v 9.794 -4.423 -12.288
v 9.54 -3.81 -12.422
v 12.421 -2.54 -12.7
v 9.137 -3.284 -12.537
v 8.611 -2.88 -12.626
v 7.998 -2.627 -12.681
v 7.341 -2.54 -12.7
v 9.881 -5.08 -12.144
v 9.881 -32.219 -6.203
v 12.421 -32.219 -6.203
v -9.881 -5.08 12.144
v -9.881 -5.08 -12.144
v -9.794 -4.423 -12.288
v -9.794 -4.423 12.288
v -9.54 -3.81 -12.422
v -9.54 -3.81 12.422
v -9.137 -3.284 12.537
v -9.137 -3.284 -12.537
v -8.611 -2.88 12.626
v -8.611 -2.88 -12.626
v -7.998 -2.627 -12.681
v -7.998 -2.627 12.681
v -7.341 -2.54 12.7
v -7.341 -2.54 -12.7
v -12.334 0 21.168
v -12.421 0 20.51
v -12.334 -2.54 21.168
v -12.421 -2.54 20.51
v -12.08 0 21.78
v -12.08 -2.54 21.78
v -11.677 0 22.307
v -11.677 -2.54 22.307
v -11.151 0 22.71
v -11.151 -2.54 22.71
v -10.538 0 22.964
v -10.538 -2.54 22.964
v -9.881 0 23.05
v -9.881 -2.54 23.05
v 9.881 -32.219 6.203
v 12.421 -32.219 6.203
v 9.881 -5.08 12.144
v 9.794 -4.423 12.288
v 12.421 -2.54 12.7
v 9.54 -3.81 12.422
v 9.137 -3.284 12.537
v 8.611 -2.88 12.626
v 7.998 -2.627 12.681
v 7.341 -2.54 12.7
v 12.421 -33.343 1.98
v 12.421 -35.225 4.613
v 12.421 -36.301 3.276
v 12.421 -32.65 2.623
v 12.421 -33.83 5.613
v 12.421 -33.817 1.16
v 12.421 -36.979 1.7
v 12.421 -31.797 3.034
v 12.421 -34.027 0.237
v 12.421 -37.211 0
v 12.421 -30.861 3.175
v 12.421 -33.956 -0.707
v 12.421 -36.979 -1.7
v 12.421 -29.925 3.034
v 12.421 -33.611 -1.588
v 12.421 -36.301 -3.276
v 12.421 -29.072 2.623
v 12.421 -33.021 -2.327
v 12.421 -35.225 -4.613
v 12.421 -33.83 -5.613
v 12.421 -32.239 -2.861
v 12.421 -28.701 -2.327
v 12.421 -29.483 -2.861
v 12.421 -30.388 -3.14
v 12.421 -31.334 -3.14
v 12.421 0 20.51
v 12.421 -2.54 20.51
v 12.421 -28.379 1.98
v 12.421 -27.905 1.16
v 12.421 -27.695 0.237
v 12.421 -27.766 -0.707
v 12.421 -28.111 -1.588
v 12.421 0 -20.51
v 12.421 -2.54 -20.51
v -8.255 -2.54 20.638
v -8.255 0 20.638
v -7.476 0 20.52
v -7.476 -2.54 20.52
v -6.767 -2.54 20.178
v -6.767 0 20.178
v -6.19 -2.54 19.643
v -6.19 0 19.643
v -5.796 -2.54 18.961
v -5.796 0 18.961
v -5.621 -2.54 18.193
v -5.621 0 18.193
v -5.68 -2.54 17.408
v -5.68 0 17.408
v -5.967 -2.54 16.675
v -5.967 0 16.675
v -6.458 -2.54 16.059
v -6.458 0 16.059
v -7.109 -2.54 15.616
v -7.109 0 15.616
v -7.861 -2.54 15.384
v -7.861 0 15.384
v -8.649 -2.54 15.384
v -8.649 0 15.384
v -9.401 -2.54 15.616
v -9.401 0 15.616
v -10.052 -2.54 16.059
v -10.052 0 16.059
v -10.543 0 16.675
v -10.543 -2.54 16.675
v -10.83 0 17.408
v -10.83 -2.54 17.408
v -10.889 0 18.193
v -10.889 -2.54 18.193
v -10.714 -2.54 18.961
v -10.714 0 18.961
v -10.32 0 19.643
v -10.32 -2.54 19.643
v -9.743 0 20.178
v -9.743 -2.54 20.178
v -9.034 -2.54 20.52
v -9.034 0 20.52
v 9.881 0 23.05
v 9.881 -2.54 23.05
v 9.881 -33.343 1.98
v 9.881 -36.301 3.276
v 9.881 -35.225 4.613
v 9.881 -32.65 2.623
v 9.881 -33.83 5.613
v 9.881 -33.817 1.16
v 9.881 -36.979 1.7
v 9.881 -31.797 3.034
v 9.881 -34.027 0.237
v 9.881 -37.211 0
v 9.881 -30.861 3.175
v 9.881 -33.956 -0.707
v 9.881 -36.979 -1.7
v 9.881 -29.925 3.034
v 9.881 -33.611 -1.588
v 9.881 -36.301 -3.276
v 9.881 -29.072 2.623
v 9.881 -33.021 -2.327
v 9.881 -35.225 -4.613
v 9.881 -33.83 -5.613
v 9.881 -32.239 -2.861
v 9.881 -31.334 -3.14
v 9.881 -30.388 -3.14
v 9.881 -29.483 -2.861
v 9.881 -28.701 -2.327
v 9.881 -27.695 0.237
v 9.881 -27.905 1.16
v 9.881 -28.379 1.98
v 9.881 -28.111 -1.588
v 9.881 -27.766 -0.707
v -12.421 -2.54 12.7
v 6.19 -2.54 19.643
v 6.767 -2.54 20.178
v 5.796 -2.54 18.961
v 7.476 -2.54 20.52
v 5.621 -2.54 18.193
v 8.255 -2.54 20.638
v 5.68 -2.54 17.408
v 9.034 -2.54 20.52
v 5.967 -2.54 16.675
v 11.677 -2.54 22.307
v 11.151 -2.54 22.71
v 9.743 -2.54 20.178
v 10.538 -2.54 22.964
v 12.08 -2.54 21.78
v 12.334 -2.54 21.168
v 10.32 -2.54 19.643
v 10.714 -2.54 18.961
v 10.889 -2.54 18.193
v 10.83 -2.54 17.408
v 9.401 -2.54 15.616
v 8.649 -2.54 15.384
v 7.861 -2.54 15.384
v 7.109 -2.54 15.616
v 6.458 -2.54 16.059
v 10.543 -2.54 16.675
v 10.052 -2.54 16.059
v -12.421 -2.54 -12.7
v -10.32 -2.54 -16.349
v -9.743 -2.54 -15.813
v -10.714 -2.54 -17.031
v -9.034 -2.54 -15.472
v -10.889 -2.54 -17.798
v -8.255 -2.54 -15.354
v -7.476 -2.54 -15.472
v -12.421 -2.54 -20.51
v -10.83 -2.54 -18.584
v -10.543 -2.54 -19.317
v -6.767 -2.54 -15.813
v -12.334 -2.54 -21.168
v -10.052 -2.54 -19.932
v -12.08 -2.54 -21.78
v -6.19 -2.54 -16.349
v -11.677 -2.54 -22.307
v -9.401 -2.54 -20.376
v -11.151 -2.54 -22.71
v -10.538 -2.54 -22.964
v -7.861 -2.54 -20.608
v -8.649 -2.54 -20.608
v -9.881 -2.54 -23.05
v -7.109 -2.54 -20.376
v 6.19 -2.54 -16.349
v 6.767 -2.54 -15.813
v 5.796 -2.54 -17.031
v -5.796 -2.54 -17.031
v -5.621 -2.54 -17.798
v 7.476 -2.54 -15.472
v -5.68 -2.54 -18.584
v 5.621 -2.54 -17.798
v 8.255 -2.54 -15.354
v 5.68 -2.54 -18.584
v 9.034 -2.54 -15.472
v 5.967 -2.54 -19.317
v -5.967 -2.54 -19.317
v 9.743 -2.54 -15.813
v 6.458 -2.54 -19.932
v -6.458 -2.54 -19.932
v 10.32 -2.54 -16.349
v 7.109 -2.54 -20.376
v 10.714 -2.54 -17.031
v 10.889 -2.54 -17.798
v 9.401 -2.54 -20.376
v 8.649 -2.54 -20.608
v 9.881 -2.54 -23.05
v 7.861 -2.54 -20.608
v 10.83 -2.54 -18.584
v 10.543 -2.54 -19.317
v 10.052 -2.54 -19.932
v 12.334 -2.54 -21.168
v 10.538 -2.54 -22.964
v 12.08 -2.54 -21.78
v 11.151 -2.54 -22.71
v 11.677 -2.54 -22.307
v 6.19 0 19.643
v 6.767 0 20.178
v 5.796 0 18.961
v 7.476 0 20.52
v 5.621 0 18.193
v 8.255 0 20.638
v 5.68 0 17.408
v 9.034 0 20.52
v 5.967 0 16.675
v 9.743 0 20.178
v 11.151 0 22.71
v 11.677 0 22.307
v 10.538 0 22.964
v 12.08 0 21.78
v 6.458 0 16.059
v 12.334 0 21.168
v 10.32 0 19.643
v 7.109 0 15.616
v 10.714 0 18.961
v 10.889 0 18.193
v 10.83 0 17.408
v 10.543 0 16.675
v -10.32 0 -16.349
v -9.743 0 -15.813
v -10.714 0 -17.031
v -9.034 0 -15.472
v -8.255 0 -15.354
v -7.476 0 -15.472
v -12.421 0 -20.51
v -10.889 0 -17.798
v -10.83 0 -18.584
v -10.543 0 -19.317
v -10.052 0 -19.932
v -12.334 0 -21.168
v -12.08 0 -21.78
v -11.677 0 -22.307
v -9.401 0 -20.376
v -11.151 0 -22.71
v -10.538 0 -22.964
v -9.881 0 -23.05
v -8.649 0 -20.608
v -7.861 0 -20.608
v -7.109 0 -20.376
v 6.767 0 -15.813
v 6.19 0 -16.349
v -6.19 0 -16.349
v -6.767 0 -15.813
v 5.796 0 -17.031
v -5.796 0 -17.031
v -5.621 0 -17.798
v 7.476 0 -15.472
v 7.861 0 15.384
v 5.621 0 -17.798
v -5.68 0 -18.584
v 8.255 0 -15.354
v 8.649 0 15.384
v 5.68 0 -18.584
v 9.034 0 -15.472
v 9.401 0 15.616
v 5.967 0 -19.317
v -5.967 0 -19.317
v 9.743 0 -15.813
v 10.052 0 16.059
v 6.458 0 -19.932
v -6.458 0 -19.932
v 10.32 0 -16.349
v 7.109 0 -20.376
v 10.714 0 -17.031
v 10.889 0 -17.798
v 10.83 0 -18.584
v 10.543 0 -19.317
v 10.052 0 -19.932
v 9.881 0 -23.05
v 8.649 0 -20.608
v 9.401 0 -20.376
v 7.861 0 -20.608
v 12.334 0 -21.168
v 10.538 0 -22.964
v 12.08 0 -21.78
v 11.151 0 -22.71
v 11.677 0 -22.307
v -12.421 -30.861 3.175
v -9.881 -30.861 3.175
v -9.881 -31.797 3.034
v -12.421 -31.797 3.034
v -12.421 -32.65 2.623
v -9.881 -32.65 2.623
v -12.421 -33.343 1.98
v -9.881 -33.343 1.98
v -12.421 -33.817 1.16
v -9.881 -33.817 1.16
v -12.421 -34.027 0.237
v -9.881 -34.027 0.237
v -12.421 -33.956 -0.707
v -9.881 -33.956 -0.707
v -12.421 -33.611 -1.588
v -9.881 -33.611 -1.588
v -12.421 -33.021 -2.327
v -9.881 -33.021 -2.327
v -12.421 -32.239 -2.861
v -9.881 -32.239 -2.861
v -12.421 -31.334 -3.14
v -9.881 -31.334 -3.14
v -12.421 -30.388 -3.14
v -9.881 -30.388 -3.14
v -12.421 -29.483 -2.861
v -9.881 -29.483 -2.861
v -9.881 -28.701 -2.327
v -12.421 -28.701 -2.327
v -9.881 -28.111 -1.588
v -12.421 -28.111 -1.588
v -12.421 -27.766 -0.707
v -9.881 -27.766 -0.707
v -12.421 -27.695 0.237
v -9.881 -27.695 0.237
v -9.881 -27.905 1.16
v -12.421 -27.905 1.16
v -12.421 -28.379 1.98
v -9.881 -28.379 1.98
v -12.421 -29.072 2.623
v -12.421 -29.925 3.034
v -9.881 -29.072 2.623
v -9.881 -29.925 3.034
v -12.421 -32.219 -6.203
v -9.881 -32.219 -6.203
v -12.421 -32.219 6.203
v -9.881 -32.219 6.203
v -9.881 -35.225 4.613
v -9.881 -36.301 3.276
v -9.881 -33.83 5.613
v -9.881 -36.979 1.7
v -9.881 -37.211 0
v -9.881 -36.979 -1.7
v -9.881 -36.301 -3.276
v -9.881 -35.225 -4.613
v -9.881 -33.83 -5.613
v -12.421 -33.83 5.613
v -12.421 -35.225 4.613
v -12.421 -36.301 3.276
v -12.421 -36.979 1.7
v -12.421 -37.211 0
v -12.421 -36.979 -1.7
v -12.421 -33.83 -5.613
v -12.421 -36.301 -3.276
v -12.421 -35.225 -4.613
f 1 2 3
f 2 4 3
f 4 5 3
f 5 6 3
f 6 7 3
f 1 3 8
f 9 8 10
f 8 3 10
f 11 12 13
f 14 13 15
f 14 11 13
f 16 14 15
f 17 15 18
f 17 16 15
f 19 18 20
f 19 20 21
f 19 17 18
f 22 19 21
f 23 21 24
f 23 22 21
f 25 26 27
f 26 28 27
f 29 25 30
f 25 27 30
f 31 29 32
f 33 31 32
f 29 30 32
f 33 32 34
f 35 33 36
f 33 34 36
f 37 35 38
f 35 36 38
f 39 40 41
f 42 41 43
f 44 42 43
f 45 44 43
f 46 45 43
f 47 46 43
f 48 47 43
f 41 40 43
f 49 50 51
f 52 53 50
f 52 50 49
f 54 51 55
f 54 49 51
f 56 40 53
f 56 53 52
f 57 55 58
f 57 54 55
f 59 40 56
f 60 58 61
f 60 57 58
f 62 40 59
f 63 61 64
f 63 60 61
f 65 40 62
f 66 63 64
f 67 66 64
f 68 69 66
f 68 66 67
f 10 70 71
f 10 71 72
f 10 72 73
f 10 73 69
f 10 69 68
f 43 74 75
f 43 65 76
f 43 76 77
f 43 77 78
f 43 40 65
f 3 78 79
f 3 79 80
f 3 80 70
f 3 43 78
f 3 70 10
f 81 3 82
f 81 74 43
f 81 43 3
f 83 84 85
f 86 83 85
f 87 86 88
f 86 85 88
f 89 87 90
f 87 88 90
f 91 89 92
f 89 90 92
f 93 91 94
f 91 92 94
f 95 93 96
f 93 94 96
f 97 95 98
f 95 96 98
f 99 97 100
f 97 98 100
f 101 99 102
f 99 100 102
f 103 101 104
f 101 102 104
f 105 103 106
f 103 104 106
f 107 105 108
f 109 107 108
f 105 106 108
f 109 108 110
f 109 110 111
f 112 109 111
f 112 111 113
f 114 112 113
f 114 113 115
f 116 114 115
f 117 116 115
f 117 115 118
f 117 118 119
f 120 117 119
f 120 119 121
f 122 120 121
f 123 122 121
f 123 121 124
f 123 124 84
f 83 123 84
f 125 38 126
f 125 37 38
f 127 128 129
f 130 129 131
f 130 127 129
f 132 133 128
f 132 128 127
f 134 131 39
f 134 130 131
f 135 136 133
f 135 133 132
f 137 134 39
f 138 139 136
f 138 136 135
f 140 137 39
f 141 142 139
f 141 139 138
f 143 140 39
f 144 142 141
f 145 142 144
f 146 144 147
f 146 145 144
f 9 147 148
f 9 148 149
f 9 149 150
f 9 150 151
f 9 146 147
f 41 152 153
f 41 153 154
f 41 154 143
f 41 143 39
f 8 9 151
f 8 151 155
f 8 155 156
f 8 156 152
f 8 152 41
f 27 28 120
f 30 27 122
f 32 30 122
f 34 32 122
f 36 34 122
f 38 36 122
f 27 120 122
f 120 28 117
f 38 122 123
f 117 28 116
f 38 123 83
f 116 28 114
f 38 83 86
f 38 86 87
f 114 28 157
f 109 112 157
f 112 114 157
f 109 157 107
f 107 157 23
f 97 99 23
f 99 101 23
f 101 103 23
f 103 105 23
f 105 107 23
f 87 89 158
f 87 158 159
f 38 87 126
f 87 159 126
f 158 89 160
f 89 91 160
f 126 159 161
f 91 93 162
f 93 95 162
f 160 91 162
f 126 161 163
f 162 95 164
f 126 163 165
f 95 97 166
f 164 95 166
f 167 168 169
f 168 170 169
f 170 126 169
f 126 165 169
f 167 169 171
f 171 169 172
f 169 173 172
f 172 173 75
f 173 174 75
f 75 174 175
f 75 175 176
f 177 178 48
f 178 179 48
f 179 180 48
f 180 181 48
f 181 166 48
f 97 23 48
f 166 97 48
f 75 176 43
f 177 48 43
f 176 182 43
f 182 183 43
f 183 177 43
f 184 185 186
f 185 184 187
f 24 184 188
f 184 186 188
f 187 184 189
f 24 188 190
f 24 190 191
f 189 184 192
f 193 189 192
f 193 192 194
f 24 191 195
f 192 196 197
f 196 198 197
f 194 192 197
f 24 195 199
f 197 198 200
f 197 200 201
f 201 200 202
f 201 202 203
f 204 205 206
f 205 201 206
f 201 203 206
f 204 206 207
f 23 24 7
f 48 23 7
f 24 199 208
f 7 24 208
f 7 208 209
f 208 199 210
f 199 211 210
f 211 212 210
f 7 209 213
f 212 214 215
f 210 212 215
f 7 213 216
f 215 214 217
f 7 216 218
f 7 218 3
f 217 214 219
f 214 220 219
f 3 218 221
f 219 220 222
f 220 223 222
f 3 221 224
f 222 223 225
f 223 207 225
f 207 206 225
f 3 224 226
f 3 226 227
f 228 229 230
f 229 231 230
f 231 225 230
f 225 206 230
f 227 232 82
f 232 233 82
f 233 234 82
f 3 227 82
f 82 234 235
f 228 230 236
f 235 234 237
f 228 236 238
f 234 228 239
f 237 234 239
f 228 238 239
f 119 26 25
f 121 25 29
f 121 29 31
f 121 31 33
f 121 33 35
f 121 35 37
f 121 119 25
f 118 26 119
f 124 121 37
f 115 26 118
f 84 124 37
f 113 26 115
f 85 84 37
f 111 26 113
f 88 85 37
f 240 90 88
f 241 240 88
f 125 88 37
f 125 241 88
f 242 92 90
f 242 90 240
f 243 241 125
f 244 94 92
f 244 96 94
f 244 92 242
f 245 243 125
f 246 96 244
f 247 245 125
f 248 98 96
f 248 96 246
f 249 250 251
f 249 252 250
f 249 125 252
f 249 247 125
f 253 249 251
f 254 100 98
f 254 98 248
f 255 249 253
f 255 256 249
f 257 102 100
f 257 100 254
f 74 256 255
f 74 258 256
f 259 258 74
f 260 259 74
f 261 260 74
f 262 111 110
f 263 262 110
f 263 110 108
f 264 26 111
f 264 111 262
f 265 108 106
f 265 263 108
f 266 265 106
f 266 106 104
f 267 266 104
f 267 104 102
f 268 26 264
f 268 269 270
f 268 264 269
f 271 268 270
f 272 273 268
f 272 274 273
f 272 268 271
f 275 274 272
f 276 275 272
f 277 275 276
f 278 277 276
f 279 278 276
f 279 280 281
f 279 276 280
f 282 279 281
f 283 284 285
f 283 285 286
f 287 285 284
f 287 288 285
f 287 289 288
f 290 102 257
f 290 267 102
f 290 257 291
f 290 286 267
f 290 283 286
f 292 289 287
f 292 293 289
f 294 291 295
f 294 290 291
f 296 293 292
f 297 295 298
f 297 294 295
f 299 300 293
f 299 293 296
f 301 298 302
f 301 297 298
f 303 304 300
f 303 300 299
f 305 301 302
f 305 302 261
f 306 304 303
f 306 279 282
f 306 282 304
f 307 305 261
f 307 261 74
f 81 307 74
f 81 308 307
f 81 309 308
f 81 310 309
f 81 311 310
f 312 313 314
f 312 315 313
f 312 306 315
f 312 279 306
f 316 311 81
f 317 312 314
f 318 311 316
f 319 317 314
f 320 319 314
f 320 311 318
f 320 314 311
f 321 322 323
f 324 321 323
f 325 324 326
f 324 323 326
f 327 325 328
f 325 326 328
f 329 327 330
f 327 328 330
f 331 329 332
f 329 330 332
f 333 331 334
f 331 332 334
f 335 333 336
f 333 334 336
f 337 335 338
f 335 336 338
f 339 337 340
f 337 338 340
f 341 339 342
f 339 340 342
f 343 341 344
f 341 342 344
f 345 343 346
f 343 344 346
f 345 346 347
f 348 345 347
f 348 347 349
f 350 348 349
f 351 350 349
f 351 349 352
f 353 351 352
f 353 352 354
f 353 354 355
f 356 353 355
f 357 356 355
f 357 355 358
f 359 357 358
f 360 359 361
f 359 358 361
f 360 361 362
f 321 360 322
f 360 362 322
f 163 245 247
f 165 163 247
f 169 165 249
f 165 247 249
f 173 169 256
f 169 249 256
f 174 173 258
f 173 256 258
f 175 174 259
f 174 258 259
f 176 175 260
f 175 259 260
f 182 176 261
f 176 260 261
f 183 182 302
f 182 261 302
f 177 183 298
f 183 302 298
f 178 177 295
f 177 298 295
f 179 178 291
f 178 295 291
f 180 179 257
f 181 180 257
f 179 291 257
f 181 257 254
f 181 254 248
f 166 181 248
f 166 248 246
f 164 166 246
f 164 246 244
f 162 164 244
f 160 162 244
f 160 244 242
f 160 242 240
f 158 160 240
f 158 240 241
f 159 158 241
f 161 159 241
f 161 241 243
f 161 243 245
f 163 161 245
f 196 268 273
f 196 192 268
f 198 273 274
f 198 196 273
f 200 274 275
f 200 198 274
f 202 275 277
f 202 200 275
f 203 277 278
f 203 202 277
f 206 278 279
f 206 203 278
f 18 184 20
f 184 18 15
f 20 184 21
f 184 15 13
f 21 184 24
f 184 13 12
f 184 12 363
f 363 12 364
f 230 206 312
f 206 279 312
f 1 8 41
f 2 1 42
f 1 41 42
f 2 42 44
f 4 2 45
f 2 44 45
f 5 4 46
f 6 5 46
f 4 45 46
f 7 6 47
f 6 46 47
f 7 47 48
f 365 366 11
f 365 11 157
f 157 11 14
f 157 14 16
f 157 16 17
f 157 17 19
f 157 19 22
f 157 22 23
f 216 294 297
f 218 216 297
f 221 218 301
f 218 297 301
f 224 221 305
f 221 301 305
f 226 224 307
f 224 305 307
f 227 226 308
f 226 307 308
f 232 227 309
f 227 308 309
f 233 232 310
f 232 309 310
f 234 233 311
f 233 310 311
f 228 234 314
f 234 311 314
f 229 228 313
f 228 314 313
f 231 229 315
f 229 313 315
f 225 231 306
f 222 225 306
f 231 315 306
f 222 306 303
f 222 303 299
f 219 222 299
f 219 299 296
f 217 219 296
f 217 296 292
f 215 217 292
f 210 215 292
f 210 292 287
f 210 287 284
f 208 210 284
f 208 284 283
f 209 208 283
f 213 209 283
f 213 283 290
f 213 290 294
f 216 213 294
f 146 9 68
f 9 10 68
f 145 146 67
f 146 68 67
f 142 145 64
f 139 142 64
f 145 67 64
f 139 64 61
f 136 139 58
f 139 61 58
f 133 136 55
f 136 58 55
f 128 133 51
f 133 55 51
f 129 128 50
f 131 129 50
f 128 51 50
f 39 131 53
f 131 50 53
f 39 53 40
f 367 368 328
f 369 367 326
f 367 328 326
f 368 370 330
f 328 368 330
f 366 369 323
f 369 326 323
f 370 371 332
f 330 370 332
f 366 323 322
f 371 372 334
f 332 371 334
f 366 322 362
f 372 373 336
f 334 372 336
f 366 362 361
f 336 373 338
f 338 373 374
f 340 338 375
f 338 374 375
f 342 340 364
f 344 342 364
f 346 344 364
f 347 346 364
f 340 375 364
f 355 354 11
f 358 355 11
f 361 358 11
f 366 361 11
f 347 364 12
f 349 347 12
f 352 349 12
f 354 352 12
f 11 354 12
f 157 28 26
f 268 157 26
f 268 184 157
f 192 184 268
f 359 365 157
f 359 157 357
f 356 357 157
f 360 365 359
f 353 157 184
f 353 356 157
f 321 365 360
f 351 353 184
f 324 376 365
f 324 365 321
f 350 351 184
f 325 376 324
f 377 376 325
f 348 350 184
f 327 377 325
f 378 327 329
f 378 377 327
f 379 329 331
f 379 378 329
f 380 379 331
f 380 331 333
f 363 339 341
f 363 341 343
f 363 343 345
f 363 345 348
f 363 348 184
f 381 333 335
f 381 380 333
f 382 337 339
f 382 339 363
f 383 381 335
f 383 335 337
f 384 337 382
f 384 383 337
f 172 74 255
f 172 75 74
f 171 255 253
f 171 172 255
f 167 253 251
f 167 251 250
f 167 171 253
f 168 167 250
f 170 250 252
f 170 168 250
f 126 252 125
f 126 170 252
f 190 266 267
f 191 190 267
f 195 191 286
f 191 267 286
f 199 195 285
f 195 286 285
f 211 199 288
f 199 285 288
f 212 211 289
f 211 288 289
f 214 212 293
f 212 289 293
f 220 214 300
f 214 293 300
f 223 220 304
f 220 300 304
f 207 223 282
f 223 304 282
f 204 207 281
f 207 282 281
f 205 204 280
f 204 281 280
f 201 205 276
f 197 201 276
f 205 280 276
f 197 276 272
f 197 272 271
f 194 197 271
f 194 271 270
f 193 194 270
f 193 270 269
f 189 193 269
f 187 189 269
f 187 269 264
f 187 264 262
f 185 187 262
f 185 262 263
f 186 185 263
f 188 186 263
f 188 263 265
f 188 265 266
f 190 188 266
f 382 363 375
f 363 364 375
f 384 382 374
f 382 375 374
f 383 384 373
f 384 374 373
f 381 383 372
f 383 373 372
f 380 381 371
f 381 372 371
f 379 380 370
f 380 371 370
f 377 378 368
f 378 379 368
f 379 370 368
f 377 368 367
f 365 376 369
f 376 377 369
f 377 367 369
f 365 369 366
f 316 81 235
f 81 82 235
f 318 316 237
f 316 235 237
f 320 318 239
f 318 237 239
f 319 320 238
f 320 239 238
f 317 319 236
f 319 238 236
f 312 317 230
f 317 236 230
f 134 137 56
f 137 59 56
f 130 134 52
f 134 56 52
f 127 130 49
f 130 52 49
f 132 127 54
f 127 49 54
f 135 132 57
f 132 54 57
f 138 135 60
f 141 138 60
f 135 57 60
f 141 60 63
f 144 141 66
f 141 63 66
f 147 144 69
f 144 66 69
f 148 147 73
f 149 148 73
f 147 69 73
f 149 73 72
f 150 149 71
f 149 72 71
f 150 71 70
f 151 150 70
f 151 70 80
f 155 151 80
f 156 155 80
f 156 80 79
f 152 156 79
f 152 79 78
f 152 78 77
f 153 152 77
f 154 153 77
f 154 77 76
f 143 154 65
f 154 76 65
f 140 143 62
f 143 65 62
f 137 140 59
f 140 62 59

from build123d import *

# Parameters (mm, degrees)
SKETCH1_W                       = 24.8412
SKETCH1_H                       = 46.101
SKETCH1_R                       = 2.6416
BOSS_EXTRUDE1_DEPTH             = 2.54
BOSS_EXTRUDE2_REACH             = 28.307
SKETCH2_R                       = 3.175
BOSS_EXTRUDE2_DIRECTION_2_REACH = 28.307
CUT_EXTRUDE1_DEPTH              = 46.500059073
CUT_EXTRUDE1_DEPTH_BACK         = 46.500059073
SKETCH3_W                       = 19.7612
SKETCH3_H                       = 34.671
FILLET1_R                       = 2.54


with BuildPart() as part:
    # Sketch1 → Boss-Extrude1 (new body)
    with BuildSketch(Plane(origin=(0, 0, 0), x_dir=(1, 0, 0), z_dir=(0, 1, 0))):
        Rectangle(SKETCH1_W, SKETCH1_H)
        with Locations(Location((-8.255, 17.9959, 0), (0, 0, 270))):
            Circle(SKETCH1_R, mode=Mode.SUBTRACT)
        with Locations(Location((8.255, 17.9959, 0), (0, 0, 270))):
            Circle(SKETCH1_R, mode=Mode.SUBTRACT)
        with Locations(Location((8.255, -17.9959, 0), (0, 0, 270))):
            Circle(SKETCH1_R, mode=Mode.SUBTRACT)
        with Locations(Location((-8.255, -17.9959, 0), (0, 0, 270))):
            Circle(SKETCH1_R, mode=Mode.SUBTRACT)
    extrude(amount=-BOSS_EXTRUDE1_DEPTH)

    # Boss-Extrude2: up to this face of the body (flat: up to its plane)
    boss_extrude2_end = Plane(part.part.faces().sort_by_distance((12.4206, -1.27, 0))[0])
    # Sketch2 → Boss-Extrude2 (add, up to the picked face)
    with BuildSketch(Plane(origin=(0, 0, 0), x_dir=(0, 0, -1), z_dir=(1, 0, 0)), mode=Mode.PRIVATE) as boss_extrude2_sk1:
        with BuildLine():
            Line((-6.203113115, -32.218898258), (-12.7, -2.54))
            Line((-12.7, -2.54), (12.7, -2.54))
            Line((12.7, -2.54), (6.203113115, -32.218898258))
            ThreePointArc((6.203113115, -32.218898258), (0, -37.211), (-6.203113115, -32.218898258))
        make_face()
        with Locations(Location((0, -30.861, 0), (0, 0, 180))):
            Circle(SKETCH2_R, mode=Mode.SUBTRACT)
    boss_extrude2_tool1 = split(extrude(boss_extrude2_sk1.sketch, amount=BOSS_EXTRUDE2_REACH, mode=Mode.PRIVATE), bisect_by=boss_extrude2_end, keep=Keep.BOTH, mode=Mode.PRIVATE)
    add(boss_extrude2_tool1.solids().sort_by(Axis((0, -16.339772, 0), (1, 0, 0)))[0])

    # Boss-Extrude2 direction 2: up to this face of the body (flat: up to its plane)
    boss_extrude2_direction_2_end = Plane(part.part.faces().sort_by_distance((-12.4206, -1.27, 0))[0])
    # Sketch2 → Boss-Extrude2 direction 2 (add, up to the picked face)
    with BuildSketch(Plane(origin=(0, 0, 0), x_dir=(0, 0, -1), z_dir=(1, 0, 0)), mode=Mode.PRIVATE) as boss_extrude2_direction_2_sk1:
        with BuildLine():
            Line((-6.203113115, -32.218898258), (-12.7, -2.54))
            Line((-12.7, -2.54), (12.7, -2.54))
            Line((12.7, -2.54), (6.203113115, -32.218898258))
            ThreePointArc((6.203113115, -32.218898258), (0, -37.211), (-6.203113115, -32.218898258))
        make_face()
        with Locations(Location((0, -30.861, 0), (0, 0, 180))):
            Circle(SKETCH2_R, mode=Mode.SUBTRACT)
    boss_extrude2_direction_2_tool1 = split(extrude(boss_extrude2_direction_2_sk1.sketch, amount=-BOSS_EXTRUDE2_DIRECTION_2_REACH, mode=Mode.PRIVATE), bisect_by=boss_extrude2_direction_2_end, keep=Keep.BOTH, mode=Mode.PRIVATE)
    add(boss_extrude2_direction_2_tool1.solids().sort_by(Axis((0, -16.339772, 0), (-1, 0, 0)))[0])

    # Sketch3 → Cut-Extrude1 (cut, two sides: drawn at the far end of the back side and taken through both)
    with BuildSketch(Plane.XY.offset(-CUT_EXTRUDE1_DEPTH_BACK)):
        with Locations((0, -19.8755)):
            Rectangle(SKETCH3_W, SKETCH3_H)
    extrude(amount=CUT_EXTRUDE1_DEPTH + CUT_EXTRUDE1_DEPTH_BACK, mode=Mode.SUBTRACT)

    # Fillet1
    fillet1_edges = [part.edges().sort_by_distance(p)[0] for p in [
        (-9.8806, -2.54, 0),
        (9.8806, -2.54, 0),
        (-12.4206, -1.27, -23.0505),
        (12.4206, -1.27, -23.0505),
        (12.4206, -1.27, 23.0505),
        (-12.4206, -1.27, 23.0505),
    ]]
    fillet(fillet1_edges, radius=FILLET1_R)


solid = part.part
